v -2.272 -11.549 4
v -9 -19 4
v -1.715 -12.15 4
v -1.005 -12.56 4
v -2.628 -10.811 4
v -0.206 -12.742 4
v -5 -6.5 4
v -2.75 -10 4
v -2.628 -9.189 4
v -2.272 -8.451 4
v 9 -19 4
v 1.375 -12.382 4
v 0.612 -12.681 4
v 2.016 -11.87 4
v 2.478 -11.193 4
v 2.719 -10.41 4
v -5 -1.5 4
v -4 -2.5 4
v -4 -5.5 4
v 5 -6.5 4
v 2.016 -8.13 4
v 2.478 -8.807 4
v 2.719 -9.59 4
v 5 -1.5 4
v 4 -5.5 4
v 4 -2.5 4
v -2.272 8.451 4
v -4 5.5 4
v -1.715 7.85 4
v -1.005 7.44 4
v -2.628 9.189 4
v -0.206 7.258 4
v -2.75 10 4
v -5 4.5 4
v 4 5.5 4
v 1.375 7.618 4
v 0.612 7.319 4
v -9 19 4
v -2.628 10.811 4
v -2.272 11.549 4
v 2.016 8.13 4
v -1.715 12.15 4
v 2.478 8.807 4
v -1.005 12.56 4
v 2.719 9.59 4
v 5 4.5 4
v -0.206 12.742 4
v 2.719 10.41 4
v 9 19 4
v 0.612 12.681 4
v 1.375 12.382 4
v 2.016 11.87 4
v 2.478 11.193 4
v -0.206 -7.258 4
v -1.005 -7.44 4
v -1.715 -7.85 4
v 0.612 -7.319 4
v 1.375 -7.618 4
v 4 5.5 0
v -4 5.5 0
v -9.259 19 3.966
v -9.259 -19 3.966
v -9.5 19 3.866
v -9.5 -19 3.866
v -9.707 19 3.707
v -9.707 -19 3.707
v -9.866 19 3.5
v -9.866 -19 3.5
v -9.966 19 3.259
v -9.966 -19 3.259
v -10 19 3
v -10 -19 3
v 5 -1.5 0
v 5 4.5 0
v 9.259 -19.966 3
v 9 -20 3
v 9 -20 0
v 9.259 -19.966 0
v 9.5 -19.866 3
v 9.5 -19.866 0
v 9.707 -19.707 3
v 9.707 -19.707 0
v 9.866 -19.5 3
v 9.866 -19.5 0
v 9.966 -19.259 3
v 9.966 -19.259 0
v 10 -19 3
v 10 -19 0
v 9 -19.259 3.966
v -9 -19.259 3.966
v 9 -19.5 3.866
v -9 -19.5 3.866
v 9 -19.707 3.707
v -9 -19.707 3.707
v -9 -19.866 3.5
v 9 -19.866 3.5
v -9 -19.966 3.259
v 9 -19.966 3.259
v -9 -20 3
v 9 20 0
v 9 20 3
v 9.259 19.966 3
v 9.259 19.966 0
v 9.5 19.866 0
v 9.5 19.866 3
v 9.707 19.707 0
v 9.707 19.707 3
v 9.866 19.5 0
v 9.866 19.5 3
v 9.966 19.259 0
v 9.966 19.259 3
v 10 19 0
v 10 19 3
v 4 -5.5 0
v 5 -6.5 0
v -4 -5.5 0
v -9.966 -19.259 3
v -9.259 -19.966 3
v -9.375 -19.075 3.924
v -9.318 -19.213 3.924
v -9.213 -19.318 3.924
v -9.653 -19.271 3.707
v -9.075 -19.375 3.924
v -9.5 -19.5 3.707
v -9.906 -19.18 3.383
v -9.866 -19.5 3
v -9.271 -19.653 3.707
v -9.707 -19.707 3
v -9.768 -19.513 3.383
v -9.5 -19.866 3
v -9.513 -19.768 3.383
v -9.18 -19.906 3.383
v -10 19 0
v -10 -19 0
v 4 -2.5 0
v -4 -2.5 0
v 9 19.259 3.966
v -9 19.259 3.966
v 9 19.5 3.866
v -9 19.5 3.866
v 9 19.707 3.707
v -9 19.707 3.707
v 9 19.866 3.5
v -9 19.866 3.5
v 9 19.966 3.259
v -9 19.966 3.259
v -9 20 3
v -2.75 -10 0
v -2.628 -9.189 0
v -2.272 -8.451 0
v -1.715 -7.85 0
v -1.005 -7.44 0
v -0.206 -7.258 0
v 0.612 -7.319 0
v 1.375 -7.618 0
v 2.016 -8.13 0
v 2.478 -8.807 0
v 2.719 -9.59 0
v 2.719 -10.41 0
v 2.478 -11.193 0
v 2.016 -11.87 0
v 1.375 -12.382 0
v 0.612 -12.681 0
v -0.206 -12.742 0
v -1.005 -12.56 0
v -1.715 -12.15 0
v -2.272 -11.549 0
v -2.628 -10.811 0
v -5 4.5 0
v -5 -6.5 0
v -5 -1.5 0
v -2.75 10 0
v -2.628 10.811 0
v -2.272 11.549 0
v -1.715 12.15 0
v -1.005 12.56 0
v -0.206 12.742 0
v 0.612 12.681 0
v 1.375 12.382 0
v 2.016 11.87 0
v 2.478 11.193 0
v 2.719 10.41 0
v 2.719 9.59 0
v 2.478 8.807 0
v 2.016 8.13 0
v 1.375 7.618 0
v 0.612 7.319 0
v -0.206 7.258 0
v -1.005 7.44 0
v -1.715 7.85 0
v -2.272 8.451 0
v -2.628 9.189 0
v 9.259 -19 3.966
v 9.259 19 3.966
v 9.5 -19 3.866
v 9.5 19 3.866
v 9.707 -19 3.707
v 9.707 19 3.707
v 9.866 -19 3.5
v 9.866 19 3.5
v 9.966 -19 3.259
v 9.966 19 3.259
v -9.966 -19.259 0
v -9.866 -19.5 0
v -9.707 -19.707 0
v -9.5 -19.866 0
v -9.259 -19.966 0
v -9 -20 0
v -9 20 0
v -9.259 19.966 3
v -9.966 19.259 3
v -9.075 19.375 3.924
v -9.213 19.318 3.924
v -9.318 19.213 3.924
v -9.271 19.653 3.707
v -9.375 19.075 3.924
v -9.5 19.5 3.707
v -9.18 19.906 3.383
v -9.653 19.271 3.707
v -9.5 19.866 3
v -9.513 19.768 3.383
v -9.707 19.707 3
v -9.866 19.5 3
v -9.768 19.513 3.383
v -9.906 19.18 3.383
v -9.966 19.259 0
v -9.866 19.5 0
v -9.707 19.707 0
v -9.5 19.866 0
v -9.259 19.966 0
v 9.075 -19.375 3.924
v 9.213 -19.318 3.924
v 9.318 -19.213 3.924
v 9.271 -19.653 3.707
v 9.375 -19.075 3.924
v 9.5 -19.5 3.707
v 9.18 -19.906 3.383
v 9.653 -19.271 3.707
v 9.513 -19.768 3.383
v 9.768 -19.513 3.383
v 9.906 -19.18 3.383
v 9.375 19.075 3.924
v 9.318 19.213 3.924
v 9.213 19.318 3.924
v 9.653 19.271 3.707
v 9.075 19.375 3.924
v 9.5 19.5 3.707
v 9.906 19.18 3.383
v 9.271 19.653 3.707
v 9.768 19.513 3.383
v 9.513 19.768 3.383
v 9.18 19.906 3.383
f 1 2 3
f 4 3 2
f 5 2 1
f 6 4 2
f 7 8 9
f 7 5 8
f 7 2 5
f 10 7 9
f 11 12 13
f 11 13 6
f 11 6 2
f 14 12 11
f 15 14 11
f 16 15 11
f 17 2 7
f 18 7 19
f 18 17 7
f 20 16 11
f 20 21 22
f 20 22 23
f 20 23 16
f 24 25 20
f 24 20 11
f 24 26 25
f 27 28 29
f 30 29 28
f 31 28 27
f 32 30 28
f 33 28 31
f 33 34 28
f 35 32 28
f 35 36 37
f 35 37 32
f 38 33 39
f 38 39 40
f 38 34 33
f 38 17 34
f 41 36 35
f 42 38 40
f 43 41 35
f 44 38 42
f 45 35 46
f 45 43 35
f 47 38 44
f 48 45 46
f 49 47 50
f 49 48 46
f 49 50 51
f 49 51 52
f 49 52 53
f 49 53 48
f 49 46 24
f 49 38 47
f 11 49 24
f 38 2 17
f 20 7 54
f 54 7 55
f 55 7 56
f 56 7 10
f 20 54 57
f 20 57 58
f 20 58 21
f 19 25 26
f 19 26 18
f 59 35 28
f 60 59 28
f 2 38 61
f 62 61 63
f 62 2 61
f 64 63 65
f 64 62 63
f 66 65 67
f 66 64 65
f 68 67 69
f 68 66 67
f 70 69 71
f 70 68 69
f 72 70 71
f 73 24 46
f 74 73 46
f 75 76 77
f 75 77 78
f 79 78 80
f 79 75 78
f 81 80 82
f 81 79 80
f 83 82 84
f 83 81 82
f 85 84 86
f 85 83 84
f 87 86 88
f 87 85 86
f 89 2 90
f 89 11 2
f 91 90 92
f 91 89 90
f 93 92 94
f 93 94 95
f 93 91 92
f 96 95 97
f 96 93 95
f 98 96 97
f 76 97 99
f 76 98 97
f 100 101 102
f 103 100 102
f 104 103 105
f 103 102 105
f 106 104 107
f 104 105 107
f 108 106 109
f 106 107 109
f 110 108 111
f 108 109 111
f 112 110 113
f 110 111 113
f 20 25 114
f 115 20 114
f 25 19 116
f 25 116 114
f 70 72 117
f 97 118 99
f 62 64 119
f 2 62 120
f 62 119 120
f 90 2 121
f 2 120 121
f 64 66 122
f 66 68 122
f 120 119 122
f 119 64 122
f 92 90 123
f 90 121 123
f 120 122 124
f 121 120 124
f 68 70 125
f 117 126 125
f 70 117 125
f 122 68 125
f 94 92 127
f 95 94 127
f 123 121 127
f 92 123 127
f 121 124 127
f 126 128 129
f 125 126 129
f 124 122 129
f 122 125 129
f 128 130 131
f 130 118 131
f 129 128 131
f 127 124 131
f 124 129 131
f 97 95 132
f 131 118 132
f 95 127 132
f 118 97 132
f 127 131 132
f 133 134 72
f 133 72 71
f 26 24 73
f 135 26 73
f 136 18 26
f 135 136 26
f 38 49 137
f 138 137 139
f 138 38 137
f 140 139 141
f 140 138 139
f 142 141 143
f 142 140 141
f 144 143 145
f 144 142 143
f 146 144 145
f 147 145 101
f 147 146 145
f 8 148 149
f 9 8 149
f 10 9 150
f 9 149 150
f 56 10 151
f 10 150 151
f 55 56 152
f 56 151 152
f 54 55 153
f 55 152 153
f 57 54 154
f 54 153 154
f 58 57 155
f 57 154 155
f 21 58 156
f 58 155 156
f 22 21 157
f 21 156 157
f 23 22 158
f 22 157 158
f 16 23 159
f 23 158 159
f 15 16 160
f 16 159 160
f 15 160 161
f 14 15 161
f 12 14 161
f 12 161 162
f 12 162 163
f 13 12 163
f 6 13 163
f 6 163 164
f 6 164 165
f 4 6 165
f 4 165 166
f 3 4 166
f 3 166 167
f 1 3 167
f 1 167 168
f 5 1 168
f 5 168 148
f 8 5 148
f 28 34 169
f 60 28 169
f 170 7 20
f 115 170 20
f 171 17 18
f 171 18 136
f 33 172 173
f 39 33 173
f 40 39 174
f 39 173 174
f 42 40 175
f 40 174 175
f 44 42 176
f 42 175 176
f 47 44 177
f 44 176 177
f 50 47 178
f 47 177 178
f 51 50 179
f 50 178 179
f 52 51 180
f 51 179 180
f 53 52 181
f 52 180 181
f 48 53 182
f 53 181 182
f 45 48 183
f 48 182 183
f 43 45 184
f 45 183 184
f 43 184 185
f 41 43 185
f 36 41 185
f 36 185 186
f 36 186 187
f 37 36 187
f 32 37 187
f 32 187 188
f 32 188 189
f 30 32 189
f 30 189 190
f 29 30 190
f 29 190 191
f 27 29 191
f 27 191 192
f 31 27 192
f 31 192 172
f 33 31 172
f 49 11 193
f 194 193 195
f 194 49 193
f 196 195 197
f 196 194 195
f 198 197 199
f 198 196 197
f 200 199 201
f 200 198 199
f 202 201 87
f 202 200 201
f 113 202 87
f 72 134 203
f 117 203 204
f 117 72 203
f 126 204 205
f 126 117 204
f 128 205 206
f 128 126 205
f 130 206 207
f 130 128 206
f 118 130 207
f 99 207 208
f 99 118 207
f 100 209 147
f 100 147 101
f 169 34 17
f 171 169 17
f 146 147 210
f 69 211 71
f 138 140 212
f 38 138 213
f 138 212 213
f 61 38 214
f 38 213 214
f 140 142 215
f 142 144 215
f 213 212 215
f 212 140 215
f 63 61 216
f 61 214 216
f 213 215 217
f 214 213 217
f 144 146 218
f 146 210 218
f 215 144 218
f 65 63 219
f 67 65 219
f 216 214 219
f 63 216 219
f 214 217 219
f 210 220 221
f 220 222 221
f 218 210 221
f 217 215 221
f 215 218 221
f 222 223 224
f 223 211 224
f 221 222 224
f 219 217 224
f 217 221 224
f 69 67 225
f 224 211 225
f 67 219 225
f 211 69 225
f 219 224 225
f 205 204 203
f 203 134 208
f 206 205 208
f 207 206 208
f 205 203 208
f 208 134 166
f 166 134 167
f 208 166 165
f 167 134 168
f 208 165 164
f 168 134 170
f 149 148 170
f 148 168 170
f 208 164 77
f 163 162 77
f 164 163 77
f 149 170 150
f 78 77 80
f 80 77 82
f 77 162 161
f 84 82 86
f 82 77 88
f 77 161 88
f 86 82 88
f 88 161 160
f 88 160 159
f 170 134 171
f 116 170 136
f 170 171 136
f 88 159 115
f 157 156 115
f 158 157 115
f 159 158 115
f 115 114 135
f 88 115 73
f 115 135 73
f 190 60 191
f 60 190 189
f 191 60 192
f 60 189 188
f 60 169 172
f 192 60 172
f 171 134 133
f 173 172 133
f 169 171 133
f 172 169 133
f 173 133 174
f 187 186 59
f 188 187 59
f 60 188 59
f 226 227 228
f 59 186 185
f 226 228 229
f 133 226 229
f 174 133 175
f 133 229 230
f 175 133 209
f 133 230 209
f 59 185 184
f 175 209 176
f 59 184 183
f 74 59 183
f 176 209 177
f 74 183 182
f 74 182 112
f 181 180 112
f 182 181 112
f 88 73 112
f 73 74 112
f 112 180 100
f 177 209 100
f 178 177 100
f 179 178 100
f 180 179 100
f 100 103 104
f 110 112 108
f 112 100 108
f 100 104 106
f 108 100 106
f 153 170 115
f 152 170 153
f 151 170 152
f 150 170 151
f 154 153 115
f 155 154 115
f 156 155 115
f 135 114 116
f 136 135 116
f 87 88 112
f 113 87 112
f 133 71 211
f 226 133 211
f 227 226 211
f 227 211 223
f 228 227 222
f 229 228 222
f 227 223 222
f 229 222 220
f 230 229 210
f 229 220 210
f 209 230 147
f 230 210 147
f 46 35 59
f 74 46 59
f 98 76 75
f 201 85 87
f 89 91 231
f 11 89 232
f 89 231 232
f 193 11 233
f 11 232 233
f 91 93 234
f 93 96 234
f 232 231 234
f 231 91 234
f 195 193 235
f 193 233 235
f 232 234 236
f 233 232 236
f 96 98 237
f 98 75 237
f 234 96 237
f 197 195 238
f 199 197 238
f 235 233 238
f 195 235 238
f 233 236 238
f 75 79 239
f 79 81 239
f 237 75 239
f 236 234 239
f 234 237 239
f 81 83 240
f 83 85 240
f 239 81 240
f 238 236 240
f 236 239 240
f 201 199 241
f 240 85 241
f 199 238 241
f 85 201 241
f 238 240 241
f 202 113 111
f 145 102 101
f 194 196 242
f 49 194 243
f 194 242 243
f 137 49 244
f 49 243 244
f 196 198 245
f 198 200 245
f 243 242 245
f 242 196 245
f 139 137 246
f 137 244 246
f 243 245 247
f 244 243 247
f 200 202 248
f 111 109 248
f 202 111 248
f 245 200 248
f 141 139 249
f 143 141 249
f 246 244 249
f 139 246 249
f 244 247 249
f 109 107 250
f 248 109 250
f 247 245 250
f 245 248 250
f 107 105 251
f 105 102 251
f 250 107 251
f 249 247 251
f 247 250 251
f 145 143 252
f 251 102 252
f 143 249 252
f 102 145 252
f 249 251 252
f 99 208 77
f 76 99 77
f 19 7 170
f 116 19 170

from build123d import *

# Parameters (mm, degrees)
F5_W     = 20
F5_H     = 40
F6_DEPTH = 4
F1_D     = 5.5
F2_R     = 1
F7_W     = 10
F7_H     = 1
F8_DEPTH = 25
F3_R     = 1
F4_SIZE  = 0.99999


# Not quite as in the source:
# - a fillet or chamfer is up to 0.001 mm smaller than in the source, because OpenCascade refuses the exact size
# - a feature names something its author has since deleted; it is built from what else it names


with BuildPart() as f6:
    # F5 (on Top) → F6 (new body)
    with BuildSketch(Plane.XY):
        Rectangle(F5_W, F5_H)
    extrude(amount=F6_DEPTH)

    # F1 (through all)
    with Locations(Plane.XY.offset(4)):
        with Locations((0, 10), (0, -10)):
            Hole(F1_D / 2)

    # F2
    f2_edges = [f6.edges().sort_by_distance(p)[0] for p in [
        (-10, -20, 2),
        (10, -20, 2),
        (-10, 20, 2),
        (10, 20, 2),
    ]]
    fillet(f2_edges, radius=F2_R)

    # F7 (on face) → F8 (cut)
    with BuildSketch(Plane.XY.offset(4)):
        Polygon((-5, -2.5), (5, -2.5), (5, 2.5), (5, 5.5), (-5, 5.5), (-5, 2.5), align=None)
        with Locations((0, -6)):
            Rectangle(F7_W, F7_H)
    extrude(amount=-F8_DEPTH, mode=Mode.SUBTRACT)

    # F3
    f3_edges = [f6.edges().sort_by_distance(p)[0] for p in [
        (0, -20, 4),
        (10, 0, 4),
        (0, 20, 4),
        (-10, 0, 4),
    ]]
    fillet(f3_edges, radius=F3_R)

    # F4 (size 1 in the source; OpenCascade refuses exactly that, so slightly less here)
    f4_edges = [f6.edges().sort_by_distance(p)[0] for p in [
        (-5, -5.5, 2),
        (5, -5.5, 2),
        (5, 5.5, 2),
        (-5, 5.5, 2),
        (-5, -2.5, 2),
        (5, -2.5, 2),
    ]]
    chamfer(f4_edges, length=F4_SIZE)


solid = f6.part
